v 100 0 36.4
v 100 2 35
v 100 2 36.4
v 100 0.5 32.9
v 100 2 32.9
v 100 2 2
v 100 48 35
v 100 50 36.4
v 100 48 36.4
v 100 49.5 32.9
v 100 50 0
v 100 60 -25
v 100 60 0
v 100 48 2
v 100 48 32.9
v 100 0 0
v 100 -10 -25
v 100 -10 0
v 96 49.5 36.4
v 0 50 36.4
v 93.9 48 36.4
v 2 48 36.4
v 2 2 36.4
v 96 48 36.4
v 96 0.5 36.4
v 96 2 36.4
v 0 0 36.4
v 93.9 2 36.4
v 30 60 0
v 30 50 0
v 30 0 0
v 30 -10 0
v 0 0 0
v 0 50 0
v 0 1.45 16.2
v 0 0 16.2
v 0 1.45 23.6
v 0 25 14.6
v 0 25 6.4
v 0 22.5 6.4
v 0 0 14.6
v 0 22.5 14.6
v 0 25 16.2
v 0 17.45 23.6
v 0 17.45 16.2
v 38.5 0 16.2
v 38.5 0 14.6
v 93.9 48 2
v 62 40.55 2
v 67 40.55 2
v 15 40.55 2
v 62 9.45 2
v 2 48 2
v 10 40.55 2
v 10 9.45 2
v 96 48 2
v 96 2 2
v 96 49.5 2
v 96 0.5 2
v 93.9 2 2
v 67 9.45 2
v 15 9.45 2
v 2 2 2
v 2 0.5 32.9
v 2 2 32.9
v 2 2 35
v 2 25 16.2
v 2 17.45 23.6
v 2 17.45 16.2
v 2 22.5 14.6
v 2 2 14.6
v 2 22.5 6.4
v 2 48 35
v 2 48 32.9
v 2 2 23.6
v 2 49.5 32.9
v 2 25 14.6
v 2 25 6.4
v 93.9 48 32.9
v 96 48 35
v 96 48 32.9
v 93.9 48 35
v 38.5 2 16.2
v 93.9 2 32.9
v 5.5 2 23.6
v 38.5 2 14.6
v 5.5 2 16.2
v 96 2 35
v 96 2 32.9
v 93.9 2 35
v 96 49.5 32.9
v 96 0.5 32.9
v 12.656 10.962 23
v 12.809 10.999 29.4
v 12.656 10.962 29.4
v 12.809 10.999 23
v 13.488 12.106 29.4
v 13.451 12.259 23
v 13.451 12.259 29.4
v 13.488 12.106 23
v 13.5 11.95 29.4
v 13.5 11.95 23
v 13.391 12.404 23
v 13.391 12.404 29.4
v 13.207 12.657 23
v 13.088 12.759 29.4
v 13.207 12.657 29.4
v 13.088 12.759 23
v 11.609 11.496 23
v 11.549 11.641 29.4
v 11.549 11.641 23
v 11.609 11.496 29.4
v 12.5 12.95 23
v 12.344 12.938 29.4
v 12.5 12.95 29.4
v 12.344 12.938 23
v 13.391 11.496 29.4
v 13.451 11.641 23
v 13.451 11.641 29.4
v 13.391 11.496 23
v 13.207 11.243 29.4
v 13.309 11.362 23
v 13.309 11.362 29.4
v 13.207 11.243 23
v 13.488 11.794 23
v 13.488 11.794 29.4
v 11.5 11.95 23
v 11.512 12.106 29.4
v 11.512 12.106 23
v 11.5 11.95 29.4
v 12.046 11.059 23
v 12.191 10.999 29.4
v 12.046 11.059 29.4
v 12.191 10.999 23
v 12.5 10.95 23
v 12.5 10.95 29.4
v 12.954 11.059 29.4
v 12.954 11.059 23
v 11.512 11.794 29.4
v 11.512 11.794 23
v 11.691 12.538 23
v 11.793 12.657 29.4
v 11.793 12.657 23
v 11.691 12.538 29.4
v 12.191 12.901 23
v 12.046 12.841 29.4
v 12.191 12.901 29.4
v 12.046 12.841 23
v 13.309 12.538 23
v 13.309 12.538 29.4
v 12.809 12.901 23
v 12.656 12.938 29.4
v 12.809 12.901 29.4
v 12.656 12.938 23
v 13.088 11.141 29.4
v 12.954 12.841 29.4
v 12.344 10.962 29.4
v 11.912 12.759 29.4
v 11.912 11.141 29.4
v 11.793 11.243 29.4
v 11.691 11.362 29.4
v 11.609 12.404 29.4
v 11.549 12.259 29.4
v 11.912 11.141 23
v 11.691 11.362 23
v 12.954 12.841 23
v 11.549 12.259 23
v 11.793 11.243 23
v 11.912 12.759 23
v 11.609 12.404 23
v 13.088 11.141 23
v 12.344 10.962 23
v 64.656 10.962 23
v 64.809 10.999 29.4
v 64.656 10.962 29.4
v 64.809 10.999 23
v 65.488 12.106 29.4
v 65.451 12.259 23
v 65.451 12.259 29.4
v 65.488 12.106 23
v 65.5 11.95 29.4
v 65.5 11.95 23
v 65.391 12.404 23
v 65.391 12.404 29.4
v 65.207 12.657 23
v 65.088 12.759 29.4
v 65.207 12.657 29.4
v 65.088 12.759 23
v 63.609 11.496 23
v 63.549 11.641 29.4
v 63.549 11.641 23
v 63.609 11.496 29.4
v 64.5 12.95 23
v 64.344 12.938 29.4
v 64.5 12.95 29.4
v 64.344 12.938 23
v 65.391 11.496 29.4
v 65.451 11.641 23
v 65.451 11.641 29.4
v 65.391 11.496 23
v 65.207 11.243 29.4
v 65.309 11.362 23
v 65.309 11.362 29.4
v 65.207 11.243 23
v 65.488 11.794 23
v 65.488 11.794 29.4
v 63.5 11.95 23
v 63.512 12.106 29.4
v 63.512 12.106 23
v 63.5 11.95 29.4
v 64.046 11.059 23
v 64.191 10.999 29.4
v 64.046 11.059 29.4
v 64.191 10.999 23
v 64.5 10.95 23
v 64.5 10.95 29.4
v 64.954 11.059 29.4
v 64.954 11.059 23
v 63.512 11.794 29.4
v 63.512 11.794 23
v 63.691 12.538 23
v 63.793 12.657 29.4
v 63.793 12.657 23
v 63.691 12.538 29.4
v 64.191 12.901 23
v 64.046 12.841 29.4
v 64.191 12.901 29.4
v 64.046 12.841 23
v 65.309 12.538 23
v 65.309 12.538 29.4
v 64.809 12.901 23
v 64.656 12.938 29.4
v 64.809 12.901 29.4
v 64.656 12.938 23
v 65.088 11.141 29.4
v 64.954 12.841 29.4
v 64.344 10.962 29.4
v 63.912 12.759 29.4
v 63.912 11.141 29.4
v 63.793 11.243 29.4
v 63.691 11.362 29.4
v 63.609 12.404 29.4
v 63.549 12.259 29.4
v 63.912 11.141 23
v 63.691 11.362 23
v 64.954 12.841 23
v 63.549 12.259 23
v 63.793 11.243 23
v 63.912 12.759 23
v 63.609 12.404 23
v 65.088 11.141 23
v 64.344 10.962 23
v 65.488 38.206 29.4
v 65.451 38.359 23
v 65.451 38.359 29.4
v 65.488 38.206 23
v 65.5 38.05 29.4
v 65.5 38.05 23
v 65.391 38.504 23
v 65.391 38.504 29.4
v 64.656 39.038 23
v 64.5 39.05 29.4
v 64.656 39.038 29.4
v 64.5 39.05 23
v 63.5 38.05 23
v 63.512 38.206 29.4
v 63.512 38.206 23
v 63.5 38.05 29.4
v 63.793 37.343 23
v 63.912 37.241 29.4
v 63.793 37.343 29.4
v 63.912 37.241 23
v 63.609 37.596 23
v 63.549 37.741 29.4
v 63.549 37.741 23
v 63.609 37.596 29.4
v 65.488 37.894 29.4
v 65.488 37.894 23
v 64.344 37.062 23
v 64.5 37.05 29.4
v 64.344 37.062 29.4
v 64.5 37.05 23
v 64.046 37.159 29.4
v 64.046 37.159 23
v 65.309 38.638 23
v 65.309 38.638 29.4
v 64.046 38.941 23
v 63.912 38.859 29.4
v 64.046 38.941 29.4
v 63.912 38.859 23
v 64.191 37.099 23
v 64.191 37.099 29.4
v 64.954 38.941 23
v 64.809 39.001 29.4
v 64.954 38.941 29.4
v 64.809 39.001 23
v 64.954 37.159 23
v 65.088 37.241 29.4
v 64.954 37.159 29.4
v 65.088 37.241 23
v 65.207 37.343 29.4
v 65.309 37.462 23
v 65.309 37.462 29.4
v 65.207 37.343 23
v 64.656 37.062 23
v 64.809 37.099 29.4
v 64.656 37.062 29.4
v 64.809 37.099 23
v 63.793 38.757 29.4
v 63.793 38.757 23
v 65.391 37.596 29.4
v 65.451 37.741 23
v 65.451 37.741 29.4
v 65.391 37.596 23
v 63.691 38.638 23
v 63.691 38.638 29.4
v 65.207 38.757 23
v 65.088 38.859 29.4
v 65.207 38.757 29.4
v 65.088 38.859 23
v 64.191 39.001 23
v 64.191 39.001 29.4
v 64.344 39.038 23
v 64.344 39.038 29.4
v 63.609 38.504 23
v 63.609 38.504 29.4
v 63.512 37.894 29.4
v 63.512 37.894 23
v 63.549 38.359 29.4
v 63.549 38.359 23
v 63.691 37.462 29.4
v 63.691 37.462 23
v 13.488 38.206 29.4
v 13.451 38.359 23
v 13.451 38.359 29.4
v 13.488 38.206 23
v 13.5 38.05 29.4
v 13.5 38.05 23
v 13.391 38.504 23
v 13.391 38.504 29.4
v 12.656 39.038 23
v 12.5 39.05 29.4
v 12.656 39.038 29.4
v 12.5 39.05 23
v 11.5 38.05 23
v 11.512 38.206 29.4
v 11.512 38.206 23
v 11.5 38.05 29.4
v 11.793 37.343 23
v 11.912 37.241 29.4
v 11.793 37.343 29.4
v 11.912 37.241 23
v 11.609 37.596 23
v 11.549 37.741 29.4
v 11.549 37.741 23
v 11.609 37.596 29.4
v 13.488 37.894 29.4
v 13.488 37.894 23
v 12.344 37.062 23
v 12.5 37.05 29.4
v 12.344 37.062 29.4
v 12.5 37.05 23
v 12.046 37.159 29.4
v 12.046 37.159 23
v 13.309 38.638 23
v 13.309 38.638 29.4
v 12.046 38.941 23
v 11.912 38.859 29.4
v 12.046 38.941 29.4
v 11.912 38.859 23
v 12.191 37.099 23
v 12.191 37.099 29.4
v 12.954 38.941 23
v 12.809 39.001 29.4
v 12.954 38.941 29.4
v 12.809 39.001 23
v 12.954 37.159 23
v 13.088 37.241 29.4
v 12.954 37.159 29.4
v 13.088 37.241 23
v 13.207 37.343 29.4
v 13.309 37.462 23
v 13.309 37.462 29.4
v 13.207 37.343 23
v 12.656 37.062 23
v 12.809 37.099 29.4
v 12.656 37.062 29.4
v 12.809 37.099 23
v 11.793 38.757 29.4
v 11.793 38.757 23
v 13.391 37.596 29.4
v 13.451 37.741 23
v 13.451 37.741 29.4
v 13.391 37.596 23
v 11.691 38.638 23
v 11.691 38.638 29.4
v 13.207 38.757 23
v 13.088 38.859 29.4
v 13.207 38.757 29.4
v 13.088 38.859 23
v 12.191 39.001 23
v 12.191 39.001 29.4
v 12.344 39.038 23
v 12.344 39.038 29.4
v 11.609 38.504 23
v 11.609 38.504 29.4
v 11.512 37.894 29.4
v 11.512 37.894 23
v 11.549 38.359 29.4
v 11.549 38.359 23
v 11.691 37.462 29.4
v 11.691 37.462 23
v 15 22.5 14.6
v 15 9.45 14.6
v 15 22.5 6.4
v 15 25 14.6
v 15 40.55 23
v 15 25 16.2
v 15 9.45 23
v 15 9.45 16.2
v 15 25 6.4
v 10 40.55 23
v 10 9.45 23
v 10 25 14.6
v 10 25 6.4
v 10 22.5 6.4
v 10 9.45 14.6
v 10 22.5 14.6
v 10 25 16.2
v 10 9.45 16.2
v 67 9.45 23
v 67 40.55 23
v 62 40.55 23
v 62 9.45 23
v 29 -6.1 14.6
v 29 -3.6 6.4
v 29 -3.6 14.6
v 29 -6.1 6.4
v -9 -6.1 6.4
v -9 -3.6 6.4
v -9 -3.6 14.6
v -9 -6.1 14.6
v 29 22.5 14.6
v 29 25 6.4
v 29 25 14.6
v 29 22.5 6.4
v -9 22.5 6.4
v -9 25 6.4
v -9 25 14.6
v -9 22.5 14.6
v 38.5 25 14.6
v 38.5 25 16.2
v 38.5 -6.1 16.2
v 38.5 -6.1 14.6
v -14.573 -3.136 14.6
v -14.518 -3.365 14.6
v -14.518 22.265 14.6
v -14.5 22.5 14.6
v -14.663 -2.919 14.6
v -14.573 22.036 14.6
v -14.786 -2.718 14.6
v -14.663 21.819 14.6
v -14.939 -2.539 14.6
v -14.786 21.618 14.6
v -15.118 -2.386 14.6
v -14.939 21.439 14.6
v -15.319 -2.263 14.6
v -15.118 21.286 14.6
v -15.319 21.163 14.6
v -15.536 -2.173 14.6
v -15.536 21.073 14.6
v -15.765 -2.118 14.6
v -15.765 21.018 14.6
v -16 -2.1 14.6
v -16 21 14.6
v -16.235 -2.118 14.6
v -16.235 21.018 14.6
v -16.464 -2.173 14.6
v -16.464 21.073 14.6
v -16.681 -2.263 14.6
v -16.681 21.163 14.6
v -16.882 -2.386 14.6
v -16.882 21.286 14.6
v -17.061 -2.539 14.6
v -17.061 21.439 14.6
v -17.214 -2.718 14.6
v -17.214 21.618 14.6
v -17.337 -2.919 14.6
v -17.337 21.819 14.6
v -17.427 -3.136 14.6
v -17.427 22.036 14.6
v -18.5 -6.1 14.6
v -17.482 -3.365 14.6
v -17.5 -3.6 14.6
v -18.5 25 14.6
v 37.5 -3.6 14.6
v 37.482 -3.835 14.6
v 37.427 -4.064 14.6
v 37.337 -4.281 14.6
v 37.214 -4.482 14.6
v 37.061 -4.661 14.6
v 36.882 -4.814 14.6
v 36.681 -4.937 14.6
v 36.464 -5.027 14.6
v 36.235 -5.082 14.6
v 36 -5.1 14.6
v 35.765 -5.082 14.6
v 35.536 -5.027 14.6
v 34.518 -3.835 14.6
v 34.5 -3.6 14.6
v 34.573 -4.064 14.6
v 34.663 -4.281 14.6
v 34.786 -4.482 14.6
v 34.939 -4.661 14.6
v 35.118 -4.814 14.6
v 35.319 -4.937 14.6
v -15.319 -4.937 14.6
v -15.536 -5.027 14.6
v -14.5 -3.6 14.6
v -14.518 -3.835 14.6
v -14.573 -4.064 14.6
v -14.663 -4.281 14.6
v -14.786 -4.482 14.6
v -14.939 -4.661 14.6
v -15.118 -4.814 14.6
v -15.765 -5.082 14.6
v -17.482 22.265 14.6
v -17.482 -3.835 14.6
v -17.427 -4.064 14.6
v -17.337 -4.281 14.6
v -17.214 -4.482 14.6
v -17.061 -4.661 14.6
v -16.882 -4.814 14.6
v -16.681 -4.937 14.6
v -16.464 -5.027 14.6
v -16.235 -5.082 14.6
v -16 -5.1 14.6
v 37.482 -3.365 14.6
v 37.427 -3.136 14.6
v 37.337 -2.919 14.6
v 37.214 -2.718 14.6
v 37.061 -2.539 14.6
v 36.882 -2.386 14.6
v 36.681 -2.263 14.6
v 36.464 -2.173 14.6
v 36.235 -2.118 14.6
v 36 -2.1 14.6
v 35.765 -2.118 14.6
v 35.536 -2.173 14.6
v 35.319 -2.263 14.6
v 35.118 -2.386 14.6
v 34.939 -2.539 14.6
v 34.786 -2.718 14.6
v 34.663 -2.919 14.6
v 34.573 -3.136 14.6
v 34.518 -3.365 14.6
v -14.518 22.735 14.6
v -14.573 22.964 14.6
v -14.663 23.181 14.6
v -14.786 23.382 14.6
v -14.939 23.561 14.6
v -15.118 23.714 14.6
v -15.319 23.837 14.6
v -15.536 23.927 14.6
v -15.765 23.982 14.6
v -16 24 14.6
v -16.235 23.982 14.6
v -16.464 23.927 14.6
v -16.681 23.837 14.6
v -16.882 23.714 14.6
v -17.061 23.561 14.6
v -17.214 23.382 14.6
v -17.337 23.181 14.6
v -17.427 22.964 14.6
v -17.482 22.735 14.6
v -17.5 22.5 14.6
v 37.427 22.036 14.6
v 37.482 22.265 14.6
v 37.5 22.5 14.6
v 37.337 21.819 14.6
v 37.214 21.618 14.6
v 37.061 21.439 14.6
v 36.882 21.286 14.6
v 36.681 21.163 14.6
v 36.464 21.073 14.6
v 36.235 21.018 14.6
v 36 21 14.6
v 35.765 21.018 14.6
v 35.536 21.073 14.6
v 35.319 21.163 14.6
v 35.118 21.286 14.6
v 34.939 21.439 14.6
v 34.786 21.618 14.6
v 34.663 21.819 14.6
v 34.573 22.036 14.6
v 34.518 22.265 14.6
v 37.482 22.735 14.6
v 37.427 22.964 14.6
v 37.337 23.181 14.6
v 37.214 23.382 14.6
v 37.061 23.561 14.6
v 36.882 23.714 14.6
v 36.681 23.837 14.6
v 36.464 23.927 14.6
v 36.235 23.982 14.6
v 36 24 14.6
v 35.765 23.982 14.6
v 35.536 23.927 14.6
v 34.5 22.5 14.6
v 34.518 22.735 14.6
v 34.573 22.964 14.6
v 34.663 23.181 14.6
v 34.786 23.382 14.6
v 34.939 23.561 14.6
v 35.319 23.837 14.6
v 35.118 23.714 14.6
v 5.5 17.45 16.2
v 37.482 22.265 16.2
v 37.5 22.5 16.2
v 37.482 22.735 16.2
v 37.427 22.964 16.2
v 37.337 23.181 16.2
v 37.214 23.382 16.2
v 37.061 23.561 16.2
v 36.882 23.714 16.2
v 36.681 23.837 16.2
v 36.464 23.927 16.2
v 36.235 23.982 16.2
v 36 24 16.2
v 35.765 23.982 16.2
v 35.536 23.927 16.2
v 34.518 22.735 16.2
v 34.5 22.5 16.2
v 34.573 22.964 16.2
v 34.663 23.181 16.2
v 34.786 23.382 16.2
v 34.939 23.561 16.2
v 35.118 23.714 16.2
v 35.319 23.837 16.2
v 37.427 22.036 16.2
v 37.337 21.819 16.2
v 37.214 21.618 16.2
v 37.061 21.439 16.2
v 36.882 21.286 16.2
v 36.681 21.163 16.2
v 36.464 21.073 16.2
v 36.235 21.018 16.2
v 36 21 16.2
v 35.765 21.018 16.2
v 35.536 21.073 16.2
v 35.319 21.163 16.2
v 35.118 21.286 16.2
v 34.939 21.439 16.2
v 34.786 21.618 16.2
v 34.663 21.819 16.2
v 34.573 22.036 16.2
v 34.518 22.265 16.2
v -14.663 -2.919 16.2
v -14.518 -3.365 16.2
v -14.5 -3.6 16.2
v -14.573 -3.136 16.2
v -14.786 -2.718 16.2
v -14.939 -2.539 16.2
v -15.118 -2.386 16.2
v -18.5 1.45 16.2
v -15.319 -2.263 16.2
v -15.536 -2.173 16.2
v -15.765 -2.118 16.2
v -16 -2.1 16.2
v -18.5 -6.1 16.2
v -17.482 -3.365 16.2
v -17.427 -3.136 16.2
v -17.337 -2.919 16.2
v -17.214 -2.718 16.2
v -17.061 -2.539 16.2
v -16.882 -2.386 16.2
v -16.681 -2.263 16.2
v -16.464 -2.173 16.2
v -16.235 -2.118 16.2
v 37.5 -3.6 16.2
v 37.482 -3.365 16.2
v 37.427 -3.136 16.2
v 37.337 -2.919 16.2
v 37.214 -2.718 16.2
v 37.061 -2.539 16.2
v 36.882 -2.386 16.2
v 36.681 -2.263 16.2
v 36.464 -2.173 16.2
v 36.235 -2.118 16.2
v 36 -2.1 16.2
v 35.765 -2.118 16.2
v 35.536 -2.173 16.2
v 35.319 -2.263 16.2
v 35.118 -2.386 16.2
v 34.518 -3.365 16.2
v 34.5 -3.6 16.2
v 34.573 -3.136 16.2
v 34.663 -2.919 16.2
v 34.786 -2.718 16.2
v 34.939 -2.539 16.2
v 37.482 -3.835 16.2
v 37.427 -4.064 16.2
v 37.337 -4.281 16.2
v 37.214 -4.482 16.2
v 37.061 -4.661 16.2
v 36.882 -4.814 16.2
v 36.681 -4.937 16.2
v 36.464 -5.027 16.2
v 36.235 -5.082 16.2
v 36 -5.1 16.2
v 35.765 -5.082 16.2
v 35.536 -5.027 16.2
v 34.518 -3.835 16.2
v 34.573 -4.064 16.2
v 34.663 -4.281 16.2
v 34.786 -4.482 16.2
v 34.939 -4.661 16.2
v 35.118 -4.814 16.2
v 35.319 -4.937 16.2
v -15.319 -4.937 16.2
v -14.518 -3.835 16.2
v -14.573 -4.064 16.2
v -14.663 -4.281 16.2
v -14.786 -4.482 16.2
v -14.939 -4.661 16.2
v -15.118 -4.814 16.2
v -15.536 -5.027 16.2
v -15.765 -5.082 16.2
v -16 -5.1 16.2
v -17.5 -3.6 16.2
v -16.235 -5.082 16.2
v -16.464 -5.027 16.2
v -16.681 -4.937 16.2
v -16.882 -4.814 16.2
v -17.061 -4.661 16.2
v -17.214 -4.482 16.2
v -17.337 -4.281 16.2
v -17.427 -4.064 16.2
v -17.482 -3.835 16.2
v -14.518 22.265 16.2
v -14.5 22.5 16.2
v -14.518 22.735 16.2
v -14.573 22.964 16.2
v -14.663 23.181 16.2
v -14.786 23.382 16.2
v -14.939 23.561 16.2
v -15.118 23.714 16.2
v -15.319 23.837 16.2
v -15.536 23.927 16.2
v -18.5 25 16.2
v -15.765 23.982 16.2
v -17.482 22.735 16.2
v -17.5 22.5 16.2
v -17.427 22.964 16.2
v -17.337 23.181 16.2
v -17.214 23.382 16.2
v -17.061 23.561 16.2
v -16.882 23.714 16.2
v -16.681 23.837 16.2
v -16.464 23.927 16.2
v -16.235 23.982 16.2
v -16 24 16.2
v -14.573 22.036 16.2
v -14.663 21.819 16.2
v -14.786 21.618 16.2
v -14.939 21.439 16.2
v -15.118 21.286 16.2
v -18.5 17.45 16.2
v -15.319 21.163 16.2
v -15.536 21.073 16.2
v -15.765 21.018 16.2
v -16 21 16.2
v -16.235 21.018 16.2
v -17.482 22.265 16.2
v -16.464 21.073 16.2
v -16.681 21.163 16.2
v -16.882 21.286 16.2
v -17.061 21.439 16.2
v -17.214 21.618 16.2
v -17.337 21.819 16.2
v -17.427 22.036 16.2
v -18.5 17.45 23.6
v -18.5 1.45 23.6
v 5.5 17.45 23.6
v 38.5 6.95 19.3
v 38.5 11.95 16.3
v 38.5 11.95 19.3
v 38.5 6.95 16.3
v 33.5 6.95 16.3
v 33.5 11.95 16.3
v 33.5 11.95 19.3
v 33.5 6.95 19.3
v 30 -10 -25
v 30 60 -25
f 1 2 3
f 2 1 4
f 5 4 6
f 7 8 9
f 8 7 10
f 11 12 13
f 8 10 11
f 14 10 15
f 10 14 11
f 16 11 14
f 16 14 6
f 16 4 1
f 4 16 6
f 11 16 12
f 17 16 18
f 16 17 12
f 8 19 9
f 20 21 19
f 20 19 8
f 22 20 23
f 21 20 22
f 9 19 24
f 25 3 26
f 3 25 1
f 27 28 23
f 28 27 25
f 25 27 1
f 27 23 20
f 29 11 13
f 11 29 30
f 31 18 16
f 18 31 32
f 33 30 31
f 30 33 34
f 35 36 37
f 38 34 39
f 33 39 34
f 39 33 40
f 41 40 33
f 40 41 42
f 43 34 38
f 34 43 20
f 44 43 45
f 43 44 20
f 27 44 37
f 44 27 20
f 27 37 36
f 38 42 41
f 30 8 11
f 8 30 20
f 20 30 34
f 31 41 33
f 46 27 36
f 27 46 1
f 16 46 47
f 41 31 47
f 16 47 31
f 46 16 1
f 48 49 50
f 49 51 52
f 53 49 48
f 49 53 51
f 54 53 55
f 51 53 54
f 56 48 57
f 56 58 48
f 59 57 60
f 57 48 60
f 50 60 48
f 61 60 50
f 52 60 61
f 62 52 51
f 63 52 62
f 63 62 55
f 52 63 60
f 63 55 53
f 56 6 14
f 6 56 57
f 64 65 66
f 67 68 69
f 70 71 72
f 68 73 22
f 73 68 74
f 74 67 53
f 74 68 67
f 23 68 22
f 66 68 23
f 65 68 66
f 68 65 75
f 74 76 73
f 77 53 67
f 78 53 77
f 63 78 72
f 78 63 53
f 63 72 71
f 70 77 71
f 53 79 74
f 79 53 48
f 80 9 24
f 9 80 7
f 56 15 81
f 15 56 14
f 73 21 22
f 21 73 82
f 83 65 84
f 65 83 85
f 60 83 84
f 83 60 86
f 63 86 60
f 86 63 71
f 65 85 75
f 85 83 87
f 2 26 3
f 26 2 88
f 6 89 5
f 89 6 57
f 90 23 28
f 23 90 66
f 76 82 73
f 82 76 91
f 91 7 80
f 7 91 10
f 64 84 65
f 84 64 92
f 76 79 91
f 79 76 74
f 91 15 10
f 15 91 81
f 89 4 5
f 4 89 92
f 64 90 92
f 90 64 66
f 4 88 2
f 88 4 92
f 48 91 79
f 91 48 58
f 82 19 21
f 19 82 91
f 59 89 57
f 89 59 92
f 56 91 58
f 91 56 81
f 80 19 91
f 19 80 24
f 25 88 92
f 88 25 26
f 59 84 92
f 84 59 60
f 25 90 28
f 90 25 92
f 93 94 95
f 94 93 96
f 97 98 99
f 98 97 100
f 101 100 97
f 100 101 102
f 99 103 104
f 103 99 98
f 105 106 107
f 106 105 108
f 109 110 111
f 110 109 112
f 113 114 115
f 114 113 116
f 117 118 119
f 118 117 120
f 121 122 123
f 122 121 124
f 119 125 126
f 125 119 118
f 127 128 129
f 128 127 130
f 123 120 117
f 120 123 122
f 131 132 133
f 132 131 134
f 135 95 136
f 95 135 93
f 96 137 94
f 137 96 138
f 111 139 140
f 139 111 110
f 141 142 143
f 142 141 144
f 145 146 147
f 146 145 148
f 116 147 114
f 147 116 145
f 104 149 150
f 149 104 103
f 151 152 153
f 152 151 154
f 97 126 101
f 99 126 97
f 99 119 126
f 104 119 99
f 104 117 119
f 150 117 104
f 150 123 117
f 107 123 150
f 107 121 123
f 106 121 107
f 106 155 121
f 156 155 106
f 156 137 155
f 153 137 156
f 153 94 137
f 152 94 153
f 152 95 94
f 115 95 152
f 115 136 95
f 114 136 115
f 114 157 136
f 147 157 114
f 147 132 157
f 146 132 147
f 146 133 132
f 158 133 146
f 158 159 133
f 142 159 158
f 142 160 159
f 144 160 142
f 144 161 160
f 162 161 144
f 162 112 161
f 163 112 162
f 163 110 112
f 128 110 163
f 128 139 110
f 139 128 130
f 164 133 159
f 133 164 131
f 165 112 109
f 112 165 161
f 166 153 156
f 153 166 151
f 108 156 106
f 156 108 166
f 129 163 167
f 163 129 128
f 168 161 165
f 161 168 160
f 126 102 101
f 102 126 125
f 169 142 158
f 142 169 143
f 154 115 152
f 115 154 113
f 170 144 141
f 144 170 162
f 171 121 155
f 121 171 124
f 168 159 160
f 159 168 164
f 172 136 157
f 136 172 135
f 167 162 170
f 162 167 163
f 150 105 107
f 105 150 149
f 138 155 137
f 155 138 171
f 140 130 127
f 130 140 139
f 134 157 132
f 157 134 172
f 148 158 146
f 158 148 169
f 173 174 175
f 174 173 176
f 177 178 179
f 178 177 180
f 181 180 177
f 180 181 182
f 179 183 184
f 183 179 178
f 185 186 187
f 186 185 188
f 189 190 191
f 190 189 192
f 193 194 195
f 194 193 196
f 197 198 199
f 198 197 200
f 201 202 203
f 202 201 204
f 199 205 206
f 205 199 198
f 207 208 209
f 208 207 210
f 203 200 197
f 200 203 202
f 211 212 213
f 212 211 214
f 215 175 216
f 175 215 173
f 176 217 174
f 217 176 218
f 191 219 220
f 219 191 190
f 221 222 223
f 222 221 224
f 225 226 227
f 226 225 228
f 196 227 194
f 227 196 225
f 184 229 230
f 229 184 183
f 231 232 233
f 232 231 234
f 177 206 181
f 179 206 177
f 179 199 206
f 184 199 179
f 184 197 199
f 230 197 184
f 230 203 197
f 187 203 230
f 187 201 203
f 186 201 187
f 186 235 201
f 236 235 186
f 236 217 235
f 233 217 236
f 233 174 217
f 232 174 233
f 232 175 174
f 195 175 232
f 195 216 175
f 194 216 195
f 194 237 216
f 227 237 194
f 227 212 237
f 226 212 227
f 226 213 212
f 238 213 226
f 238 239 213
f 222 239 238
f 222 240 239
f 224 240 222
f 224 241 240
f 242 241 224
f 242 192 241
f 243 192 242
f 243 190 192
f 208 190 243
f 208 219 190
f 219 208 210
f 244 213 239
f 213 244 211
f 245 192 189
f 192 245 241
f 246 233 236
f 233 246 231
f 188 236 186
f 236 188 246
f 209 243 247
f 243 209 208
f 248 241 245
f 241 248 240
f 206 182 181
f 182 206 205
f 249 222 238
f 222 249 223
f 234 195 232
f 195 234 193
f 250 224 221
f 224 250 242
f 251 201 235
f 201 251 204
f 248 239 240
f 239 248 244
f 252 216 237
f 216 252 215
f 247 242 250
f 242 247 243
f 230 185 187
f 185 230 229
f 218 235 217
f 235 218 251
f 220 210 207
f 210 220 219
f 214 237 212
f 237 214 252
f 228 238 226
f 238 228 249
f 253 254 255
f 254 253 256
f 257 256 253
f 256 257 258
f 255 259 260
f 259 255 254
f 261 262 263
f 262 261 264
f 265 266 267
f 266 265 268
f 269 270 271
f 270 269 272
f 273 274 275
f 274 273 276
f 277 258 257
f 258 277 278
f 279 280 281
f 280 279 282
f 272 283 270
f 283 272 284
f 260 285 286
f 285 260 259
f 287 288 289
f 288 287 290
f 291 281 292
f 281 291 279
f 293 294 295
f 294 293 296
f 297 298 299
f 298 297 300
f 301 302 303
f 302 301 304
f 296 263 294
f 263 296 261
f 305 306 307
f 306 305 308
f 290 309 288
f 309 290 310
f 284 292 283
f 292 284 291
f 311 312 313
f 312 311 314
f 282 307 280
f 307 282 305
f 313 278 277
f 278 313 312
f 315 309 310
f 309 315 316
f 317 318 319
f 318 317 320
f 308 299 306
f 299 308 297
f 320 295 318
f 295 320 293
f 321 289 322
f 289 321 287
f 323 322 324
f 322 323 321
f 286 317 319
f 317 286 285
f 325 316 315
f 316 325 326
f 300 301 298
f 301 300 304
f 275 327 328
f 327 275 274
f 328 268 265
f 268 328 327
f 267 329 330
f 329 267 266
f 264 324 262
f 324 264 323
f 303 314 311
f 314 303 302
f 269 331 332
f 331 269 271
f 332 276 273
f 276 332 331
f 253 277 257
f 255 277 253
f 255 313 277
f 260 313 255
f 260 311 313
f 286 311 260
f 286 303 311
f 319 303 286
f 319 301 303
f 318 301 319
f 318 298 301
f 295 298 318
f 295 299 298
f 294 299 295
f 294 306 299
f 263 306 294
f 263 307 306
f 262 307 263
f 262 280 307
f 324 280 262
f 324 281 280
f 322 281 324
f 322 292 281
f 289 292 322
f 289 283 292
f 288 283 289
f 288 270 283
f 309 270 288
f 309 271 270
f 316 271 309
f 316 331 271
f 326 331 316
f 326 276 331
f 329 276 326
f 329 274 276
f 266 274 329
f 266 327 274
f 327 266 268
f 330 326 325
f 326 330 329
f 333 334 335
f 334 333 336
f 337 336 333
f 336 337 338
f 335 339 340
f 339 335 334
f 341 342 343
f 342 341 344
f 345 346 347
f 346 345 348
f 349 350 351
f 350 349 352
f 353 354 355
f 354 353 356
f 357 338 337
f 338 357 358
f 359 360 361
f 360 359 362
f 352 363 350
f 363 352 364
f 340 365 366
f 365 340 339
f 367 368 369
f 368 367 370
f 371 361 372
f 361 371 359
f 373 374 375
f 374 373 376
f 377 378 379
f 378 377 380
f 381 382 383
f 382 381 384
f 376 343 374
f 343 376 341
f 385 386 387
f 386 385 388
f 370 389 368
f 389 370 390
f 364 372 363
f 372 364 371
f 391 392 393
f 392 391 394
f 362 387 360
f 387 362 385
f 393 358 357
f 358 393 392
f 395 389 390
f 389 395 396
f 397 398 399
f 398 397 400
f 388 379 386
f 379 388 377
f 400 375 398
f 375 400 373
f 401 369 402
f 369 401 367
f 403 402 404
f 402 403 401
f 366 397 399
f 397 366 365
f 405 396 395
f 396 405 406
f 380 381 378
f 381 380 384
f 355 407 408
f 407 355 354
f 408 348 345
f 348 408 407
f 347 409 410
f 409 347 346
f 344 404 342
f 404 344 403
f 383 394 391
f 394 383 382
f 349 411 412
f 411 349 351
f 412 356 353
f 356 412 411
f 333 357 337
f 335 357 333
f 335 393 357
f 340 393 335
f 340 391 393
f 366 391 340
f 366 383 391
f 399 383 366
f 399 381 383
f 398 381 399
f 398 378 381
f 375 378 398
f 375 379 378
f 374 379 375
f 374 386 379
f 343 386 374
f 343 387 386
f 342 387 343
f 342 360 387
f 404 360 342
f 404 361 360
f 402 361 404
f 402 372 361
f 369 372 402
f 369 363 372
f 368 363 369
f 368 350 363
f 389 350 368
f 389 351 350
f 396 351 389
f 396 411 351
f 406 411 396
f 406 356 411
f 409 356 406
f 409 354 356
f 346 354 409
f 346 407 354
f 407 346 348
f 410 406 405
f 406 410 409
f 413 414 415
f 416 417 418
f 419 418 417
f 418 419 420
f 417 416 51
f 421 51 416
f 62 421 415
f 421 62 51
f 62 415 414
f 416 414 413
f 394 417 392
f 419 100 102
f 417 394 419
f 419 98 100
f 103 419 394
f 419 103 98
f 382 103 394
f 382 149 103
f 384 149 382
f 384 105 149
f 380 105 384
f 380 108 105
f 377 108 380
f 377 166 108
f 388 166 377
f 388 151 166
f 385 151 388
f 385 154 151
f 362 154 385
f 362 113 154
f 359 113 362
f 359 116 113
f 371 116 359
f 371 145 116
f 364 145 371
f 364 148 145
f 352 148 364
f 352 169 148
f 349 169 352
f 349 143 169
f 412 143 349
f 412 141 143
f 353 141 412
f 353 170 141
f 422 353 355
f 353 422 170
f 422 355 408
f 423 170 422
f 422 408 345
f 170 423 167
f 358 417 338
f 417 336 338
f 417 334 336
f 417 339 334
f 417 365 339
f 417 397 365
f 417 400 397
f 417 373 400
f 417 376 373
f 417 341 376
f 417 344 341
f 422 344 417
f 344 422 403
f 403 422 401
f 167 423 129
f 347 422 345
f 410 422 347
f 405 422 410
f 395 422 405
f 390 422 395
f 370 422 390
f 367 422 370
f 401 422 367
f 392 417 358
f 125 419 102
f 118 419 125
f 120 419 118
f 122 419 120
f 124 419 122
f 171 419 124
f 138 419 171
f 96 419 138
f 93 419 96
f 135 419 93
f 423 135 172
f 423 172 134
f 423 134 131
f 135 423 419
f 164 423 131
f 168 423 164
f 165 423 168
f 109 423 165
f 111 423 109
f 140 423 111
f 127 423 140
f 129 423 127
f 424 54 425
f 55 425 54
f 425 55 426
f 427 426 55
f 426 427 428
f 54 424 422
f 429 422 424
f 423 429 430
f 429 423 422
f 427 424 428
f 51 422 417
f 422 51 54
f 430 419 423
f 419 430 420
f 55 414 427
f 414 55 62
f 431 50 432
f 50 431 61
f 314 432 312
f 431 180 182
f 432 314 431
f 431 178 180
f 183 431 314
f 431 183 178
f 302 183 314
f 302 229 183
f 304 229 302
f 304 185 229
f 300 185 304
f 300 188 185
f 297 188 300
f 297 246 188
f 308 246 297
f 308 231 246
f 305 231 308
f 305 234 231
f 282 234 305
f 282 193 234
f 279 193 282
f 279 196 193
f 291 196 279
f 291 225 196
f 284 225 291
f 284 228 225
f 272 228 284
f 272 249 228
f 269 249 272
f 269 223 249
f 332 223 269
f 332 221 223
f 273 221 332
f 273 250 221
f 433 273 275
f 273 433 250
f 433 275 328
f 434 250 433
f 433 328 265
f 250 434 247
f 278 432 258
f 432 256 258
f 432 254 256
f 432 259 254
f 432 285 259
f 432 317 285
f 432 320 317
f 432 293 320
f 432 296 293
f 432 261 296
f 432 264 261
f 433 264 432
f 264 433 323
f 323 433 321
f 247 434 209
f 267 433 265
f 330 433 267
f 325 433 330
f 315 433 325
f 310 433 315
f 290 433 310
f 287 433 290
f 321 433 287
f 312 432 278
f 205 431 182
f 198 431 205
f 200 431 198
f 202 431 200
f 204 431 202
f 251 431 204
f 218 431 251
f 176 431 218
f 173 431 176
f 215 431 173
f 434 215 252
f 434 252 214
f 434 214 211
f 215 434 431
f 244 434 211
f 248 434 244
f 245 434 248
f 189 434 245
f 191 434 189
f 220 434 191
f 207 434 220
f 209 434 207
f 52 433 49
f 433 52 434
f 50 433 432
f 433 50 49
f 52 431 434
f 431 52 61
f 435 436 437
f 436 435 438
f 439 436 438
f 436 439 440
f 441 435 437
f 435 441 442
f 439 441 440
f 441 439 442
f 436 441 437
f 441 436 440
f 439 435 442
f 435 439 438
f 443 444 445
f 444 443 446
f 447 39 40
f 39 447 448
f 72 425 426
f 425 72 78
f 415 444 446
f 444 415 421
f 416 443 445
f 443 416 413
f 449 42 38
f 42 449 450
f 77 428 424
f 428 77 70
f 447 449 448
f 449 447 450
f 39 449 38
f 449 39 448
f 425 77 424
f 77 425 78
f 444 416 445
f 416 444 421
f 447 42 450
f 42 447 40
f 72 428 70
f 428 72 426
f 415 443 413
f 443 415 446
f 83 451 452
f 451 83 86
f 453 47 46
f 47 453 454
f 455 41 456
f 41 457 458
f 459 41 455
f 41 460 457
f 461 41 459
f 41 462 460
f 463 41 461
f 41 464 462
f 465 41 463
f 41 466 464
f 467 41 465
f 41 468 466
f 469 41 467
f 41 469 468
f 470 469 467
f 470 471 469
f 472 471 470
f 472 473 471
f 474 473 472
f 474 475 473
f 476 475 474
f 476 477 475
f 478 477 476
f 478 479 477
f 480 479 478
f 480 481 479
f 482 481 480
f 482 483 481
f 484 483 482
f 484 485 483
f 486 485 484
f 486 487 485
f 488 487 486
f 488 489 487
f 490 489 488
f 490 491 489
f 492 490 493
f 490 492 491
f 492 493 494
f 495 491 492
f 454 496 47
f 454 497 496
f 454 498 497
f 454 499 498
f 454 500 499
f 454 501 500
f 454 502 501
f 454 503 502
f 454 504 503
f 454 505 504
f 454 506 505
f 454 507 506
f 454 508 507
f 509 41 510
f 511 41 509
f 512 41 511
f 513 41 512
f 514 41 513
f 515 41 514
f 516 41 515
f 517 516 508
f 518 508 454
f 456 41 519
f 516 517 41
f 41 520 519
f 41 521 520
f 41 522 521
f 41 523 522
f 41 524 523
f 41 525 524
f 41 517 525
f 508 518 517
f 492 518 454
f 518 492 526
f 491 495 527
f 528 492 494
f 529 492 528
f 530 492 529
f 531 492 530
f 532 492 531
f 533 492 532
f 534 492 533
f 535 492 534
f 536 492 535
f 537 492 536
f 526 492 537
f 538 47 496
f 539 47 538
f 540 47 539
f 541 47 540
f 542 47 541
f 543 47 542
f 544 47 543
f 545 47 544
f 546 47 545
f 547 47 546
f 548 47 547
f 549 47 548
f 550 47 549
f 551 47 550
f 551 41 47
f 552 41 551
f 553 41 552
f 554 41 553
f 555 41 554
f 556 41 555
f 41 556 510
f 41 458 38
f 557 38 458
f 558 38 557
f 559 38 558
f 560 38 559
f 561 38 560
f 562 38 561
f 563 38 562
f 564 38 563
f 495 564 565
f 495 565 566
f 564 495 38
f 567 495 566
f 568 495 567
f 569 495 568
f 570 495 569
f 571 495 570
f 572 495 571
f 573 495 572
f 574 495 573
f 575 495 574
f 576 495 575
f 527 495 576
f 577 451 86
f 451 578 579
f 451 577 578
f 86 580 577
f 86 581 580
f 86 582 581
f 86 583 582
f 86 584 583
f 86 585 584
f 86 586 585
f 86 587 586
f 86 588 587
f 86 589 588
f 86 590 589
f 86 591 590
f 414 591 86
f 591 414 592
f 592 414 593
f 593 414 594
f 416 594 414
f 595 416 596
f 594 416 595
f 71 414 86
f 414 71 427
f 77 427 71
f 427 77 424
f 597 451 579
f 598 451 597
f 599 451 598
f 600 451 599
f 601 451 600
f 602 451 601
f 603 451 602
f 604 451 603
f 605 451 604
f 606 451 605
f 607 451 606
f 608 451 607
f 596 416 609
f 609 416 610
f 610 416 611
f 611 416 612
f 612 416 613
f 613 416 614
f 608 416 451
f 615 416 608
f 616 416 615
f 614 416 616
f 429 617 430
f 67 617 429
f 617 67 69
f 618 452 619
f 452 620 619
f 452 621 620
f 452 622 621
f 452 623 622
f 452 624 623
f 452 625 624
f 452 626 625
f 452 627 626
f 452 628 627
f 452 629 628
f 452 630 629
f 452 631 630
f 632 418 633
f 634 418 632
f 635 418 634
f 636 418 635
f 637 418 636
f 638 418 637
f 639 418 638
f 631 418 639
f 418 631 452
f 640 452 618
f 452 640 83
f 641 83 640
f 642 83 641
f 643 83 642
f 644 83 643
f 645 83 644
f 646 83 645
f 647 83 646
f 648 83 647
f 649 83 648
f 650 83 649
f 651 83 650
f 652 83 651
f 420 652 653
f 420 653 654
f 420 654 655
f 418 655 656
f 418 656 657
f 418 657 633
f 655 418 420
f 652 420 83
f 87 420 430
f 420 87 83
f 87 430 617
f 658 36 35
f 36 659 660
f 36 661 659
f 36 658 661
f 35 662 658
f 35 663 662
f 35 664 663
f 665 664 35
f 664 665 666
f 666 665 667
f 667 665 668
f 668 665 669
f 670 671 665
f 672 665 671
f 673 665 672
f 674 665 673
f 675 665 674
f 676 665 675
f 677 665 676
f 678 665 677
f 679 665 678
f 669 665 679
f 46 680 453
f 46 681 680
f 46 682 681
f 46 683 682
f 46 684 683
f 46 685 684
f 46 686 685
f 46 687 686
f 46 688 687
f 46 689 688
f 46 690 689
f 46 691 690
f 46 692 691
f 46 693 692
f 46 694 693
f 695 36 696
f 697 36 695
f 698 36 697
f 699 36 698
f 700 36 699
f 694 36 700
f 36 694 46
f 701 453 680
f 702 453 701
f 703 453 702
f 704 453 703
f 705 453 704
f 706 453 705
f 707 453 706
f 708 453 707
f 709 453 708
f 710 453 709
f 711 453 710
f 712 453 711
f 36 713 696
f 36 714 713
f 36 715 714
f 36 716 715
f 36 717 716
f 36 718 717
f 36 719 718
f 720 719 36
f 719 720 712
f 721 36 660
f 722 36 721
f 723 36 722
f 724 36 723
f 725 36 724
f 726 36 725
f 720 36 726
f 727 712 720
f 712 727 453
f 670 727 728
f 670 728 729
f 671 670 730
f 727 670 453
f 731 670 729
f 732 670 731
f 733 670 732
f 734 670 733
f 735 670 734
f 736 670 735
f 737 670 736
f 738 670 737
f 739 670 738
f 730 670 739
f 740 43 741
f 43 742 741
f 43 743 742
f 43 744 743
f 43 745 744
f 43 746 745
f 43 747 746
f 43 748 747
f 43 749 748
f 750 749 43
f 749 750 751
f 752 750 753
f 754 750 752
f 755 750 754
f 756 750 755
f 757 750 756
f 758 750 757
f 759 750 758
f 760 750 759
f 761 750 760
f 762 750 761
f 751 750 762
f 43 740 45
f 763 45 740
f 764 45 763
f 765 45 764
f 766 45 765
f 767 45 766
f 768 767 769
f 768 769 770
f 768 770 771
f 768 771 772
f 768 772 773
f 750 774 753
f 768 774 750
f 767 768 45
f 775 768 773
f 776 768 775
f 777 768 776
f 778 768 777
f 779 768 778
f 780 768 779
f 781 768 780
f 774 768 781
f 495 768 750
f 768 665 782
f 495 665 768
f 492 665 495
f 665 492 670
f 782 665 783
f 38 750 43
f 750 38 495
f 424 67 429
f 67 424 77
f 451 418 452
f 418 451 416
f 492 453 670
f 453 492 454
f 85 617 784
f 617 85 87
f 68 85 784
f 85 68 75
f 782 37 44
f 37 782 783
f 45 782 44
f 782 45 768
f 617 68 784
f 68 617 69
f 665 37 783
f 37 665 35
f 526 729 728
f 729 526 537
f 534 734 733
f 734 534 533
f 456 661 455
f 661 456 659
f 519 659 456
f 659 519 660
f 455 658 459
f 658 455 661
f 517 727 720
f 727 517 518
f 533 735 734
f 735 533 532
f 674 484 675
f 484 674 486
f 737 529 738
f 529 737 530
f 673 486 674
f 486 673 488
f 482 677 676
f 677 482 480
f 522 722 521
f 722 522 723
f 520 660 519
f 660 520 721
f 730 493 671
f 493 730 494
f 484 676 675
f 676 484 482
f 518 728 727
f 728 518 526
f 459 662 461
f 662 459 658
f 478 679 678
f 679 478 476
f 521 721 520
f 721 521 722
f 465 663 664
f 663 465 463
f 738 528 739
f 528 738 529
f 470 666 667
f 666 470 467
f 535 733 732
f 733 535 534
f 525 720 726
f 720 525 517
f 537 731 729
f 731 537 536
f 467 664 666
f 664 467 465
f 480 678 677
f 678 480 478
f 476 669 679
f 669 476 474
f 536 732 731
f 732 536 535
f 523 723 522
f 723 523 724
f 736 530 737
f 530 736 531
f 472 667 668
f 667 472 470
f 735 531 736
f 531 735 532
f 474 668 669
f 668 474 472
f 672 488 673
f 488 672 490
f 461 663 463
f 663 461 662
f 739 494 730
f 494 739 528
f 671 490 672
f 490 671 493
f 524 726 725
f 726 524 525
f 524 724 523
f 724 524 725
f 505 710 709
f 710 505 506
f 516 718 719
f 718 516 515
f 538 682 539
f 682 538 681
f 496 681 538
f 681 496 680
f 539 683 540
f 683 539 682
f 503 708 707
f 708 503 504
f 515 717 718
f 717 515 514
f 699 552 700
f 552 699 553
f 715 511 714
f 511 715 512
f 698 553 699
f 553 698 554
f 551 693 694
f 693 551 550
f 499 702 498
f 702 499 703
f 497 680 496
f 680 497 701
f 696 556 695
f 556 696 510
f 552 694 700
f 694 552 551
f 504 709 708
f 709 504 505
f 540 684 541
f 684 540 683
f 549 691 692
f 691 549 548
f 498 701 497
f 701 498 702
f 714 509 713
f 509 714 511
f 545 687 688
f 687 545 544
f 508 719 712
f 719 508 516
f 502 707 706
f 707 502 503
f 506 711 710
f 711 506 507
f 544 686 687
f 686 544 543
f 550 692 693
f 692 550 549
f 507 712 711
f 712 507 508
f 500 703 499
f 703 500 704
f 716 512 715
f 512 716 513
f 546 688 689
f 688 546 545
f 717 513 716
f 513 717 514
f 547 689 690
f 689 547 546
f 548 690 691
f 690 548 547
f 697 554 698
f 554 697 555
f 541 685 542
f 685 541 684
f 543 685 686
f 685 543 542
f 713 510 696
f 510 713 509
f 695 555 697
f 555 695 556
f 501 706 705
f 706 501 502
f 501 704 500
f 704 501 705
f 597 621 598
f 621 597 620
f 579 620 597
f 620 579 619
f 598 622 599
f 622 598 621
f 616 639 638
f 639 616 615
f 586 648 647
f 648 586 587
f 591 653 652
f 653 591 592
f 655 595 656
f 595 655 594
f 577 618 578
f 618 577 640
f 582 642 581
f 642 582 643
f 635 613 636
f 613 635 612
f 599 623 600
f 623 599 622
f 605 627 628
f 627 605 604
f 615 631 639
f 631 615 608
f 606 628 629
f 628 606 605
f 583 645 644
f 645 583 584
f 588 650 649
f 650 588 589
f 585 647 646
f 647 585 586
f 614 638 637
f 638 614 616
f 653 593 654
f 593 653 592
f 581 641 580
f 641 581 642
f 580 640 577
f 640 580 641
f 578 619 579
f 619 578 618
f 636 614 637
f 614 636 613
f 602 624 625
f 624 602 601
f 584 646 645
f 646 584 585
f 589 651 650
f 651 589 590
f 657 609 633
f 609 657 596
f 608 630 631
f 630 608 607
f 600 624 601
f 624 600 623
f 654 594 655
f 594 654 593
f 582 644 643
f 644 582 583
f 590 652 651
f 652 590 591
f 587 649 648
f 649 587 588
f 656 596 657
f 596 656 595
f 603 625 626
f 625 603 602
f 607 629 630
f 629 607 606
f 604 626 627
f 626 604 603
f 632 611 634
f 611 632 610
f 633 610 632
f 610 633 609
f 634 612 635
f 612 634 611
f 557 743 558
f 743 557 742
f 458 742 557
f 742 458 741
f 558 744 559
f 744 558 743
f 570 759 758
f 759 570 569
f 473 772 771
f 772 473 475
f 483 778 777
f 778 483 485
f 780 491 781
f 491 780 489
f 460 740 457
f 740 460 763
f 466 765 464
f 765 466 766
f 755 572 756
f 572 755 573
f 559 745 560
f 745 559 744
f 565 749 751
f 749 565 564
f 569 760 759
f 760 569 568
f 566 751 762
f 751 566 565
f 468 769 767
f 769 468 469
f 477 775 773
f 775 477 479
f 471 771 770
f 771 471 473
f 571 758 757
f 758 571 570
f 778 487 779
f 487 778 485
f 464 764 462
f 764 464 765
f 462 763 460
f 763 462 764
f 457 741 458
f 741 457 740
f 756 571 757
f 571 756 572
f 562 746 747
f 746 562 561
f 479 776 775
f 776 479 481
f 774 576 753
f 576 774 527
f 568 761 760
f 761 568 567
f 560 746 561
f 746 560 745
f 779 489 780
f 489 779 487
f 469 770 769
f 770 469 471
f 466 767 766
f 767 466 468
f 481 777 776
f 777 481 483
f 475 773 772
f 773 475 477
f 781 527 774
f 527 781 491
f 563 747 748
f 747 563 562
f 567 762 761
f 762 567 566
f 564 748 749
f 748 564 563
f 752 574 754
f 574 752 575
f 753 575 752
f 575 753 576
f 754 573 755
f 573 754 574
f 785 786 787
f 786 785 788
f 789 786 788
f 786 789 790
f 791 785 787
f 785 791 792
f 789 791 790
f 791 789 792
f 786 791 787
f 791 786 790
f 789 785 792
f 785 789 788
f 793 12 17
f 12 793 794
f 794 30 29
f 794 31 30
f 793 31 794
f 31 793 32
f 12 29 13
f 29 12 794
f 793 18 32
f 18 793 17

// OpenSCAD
// file: nodemcu.scad
// fake nodemcu
// pins + cpu = 13mm
// borad
nodemcu_board = [57, 31.1, 1.6]; //
pins = [38, 2.5, 8.2];
cpu = [24, 16, 9 - nodemcu_board.z];
nodemcu_bb = nodemcu_board + [0, 0, cpu.z + pins.z];
hole = [3, nodemcu_board.z];
holes = [
[hole.x/2, hole.x/2, 0] + [1, 1, 0],
[-hole.x/2, hole.x/2, 0] + [nodemcu_board.x - 1, 1, 0],
[-hole.x/2, -hole.x/2, 0] + [nodemcu_board.x - 1, nodemcu_board.y - 1, 0],
[hole.x/2, -hole.x/2, 0] + [1, nodemcu_board.y - 1, 0]
];
module nodemcu() {
  translate([0, 0, pins.z + nodemcu_board.z ] - nodemcu_bb/2)
  mirror([0, 0, 1]) {
    difference() {
      union() {
    // board
    cube(nodemcu_board);
    translate([0, 0, nodemcu_board.z]) {
    // fake pins row
    color("black")
        translate([(nodemcu_board.x - pins.x)/2, 0, 0])
    cube(pins);
    // fake holes
    color("black")
        translate([(nodemcu_board.x - pins.x)/2, nodemcu_board.y - pins.y, 0])
    cube(pins);
    }
    // fake cpu
    color("red")
    translate([0, (nodemcu_board.y - cpu.y)/2, - cpu.z])
    cube(cpu);
  }
  union() {
    // mount holes

    for (i = [0:3]) {
      translate(holes[i] - [0, 0, 0.01])
    cylinder(h = hole.y + 0.02, d = hole.x);
    }
  }
}

  // usb thing
  usb = [5, 5, 3];
  usb_depth = 5;
  color("gray")
  translate([nodemcu_board.x - usb.x, 0, -nodemcu_board.z - usb.z/2])
  translate([0, nodemcu_board.y - usb.y, 0]/2)
  cube([5, 5, 3]);
  }
}
module nodemcu_simple() {
    color("pink", 0.4)
    cube(nodemcu_bb);
}
//nodemcu();
//nodemcu_simple();
// main file
include<nodemcu.scad>
tolerance = 0.2;
$fn = 40;
node_offset = 15;
bat = [70, 70, 25];

function center(a, b) = (a - b)/2;

//cube([nodemcu_bb.x, nodemcu_bb.y, 1]);

//color("blue")
//cube([nodemcu_bb.x, nodemcu_bb.y, 1]);


// OUTER size
slide_height = 3;

size = [100, 50, node_offset + nodemcu_bb.z + tolerance + 0.5 + slide_height/2 + 2];
slide_size = [size.x, size.y -2, slide_height];
echo (size=size);
inset = [2, 2, 2];

difference() 
{
cube(size);
  
color("yellow")
translate(inset)
cube(size + 2*[inset.x, -inset.y, inset.z]);
  
  // TOP cap
  translate([inset.x, inset.y/2, node_offset + nodemcu_bb.z + tolerance + 0.5])
  {
    color("red")
  translate([0, -0.5, 0])
  slid([slide_size.x, slide_size.y+1, slide_size.z+0.5], 2 + 0.5);
  }
  // SIDE CAP
  translate([size.x - 4, inset.y/2, inset.z])
rotate([0, 270, 0])
  {
    color("red")
  translate([0, -0.5, 0])
  slid([size.z, slide_size.y+1, slide_size.z+0.5], 2 + 0.5);
  }
}

  
  
// cpu holder pilars
// 15 - arbitralnie wybrany offset "aby zmieścić kable"

pillar_size = [5, nodemcu_bb.y, pins.z - tolerance + node_offset];
translate([10, center(size, nodemcu_bb).y,0]) {
  for (i = [0:3]) {
  translate(holes[i] + [0, 0, pillar_size.z - 1])
        cylinder(h = cpu.z, d = 2);
  }

  color("purple")
  translate([0, center(nodemcu_bb, pillar_size).y, 0]) {
  cube(pillar_size);
    translate([nodemcu_bb.x - pillar_size.x, 0, 0])
    cube(pillar_size);
  }
  
  
  translate([0, 0, node_offset])
  nodemcu();
}



module slid(size, offset = 0) {
  // offset how much we remove from both sides
  // eg. offset = 1
  // top size = size - offset*2
  hull() {
    translate([0, offset, size.z-1])
    linear_extrude(1)
    square([size.x, size.y - offset*2 + 0.0001]);

    // bottom should be as small as possible
    linear_extrude(0.0001)
    square([size.x, size.y]);
  }
  // cut holes
}



module rounded_hole(size) {
  translate([size.x/2, size.x/2, 0])
linear_extrude(size.z)
hull() {
circle(d = size.x);
translate([0, size.y - size.x, 0])
circle(d = size.x);
}
}

if (0) {
// slid at height
translate([inset.x, 1, node_offset + nodemcu_bb.z + tolerance + 0.5])
{
difference() {
slid(slide_size, 2);
for (j = [0:3]) {
for (i = [0:17]) {
translate([10 + i*4.8, 4 + j*9, -4])
rotate([0, 0, 45])
rounded_hole([1, 10, 10]);
}
}
}
// slightly higher and wider
 // color("red", 0.5)
 // translate([0, -0.5, 0])
//  slid([slide_size.x, slide_size.y+1, slide_size.z+0.5], 2 + 0.5);
}
}


// battery
c1 = center(size, bat);
translate([c1.x*2, c1.y, -bat.z])
cube(bat);
